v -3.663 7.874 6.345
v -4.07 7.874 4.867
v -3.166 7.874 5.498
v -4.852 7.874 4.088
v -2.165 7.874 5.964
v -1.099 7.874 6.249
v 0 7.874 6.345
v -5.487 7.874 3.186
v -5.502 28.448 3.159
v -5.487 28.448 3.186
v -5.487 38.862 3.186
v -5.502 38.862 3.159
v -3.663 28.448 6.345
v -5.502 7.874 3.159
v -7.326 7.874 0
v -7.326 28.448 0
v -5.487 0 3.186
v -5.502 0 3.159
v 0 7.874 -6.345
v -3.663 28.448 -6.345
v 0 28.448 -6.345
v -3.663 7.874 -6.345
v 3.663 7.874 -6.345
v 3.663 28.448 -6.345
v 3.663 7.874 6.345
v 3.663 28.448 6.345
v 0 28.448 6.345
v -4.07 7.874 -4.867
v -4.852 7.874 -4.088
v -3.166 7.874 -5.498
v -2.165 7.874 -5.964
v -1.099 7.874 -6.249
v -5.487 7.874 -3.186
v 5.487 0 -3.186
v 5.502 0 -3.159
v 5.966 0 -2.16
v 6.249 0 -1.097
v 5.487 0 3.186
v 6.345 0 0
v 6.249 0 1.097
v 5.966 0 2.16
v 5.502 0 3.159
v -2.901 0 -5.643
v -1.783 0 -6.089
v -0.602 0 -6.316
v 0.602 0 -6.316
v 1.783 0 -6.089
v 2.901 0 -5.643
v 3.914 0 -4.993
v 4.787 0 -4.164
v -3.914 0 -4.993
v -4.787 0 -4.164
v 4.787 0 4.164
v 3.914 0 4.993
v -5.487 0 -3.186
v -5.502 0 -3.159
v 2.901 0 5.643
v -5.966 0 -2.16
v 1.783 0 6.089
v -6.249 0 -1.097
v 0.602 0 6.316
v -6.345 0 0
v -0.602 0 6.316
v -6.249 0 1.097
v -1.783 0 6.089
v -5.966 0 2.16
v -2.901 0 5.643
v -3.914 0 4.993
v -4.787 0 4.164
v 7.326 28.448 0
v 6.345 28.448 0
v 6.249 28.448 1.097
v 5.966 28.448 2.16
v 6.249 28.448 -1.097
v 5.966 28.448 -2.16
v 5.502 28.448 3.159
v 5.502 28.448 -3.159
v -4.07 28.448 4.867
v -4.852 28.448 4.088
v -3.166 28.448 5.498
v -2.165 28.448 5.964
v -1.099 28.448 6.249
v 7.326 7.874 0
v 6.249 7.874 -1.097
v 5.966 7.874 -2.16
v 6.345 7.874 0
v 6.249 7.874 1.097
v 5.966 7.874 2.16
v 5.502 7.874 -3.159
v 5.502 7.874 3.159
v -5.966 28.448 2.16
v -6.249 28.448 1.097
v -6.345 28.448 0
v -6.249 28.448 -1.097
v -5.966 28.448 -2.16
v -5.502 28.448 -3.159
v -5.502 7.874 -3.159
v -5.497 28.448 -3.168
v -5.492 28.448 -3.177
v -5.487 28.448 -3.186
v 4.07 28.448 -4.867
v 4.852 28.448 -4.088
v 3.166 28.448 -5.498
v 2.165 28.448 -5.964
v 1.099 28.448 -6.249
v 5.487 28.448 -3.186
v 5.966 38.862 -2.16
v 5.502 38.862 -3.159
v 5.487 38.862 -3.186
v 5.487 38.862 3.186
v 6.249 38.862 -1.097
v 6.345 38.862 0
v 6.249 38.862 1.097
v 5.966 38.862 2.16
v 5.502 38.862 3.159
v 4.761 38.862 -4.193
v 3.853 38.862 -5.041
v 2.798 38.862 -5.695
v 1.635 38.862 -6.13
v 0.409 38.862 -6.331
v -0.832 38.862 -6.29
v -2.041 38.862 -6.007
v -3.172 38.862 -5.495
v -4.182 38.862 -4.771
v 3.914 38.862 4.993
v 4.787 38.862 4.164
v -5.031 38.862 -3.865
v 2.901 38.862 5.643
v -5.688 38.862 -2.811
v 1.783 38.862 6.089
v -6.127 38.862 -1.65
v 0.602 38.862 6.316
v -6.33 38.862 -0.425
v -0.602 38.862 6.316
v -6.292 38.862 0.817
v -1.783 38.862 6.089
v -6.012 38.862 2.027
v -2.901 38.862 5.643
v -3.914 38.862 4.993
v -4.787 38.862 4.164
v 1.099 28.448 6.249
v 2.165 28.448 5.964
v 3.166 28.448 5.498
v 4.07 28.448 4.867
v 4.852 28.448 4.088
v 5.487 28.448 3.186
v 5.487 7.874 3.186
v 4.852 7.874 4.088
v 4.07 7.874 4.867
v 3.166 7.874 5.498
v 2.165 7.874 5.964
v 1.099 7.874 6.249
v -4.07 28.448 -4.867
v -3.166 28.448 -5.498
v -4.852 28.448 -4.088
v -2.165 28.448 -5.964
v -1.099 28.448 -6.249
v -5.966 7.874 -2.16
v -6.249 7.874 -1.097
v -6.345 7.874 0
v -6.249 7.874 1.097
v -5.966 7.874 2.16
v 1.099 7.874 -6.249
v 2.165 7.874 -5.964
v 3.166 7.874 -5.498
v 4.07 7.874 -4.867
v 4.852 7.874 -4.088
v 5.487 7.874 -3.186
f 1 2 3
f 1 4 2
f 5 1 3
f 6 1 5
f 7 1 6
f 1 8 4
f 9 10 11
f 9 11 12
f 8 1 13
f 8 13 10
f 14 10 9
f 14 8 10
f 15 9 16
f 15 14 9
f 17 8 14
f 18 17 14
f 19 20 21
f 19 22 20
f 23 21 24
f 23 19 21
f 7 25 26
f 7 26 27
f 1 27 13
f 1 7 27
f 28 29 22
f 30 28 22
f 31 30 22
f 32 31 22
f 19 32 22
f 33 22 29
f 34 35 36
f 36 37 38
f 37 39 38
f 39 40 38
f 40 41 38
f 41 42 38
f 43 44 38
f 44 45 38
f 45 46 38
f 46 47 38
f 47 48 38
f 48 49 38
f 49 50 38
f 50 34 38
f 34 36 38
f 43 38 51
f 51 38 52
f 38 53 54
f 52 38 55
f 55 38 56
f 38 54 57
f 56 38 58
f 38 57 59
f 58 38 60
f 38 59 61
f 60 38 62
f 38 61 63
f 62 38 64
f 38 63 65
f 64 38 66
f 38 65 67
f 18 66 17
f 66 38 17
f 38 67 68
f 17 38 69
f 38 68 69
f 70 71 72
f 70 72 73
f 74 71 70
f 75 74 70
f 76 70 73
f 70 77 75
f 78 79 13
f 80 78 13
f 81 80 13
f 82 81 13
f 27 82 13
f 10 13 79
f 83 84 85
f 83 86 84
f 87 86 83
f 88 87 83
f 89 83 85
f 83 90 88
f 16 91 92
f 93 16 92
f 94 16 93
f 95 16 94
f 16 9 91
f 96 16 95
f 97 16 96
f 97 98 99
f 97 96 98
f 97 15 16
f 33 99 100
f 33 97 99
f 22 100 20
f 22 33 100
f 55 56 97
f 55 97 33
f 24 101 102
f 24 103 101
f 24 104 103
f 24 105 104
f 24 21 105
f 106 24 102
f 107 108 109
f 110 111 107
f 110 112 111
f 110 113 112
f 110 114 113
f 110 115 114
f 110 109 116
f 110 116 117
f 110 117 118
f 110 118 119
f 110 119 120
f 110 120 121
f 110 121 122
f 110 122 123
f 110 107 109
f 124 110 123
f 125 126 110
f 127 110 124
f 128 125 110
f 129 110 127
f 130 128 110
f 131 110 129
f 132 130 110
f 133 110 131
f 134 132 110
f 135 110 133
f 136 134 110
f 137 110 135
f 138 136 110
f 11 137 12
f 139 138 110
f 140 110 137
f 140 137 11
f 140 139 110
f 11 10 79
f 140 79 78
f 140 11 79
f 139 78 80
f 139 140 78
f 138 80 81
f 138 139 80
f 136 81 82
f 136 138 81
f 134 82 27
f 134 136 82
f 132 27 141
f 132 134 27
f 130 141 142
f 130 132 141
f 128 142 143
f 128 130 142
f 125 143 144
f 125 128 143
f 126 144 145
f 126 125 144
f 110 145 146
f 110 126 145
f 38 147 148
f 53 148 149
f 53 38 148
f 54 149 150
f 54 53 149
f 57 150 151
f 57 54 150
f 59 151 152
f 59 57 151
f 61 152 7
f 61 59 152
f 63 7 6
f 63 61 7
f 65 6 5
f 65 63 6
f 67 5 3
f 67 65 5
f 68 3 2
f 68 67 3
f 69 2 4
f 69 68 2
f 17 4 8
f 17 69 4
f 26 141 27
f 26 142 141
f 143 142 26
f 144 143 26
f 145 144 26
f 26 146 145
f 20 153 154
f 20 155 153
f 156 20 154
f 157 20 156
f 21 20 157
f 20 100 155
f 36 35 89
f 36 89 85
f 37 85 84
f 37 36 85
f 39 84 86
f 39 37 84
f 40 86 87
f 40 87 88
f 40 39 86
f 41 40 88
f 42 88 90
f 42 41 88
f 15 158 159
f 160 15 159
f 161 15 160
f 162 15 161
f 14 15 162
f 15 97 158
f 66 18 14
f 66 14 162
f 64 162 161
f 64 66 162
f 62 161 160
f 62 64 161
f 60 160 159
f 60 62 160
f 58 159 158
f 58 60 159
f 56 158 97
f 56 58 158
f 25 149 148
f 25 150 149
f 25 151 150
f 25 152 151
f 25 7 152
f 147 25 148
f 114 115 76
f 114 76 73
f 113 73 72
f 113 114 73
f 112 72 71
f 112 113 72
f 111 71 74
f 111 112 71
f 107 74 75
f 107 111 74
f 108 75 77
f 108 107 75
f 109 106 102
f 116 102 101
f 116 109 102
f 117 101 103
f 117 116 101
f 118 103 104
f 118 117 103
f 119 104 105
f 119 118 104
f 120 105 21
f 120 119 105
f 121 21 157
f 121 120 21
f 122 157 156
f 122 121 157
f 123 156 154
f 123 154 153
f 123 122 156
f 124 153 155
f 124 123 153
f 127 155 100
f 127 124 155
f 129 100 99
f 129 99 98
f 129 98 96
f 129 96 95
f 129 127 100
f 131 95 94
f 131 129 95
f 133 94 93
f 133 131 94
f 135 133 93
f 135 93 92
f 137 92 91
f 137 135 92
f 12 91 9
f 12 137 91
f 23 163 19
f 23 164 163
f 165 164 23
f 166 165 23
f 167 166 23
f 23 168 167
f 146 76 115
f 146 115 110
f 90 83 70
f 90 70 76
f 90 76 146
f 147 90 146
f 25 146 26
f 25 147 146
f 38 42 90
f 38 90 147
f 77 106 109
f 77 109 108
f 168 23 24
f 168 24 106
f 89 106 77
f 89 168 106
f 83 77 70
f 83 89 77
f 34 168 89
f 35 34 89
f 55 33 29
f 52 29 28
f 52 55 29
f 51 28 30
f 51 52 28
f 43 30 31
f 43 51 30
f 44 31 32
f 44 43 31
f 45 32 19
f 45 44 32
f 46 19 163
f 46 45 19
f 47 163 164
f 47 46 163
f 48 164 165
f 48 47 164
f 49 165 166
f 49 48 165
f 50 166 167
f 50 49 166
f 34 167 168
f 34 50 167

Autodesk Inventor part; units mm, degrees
ref_plane "YZ Plane" through (0, 0, 0) normal (1, 0, 0) x (0, 1, 0)
ref_plane "XZ Plane" through (0, 0, 0) normal (0, 1, 0) x (-1, 0, 0)
ref_plane "XY Plane" through (0, 0, 0) normal (0, 0, 1) x (1, 0, 0)
sketch "Sketch1" plane through (0, 0, 0) normal (0, 1, 0) x (-1, 0, 0)
  line L0 (-3.6631, -6.3447) -> (-7.3262, 0)
  line L1 (-7.3262, 0) -> (-3.6631, 6.3447)
  line L2 (-3.6631, 6.3447) -> (3.6631, 6.3447)
  line L3 (3.6631, 6.3447) -> (7.3262, 0)
  line L4 (7.3262, 0) -> (3.6631, -6.3447)
  line L5 (3.6631, -6.3447) -> (-3.6631, -6.3447)
  point P0 (0, 0)
  point P1 (0, 0)
extrude "Extrusion1" add sketch "Sketch1" along normal blind 38.862
sketch "Sketch2" plane through (0, 38.862, 0) normal (0, 1, 0) x (1, 0, 0)
  circle A0 centre (0, 0) radius 6.3447
  line L0 (-3.6631, 6.3447) -> (-7.3262, 0) projected
  line L1 (-12.7498, -15.4851) -> (22.5218, -15.4851)
  line L2 (22.5218, -15.4851) -> (22.5218, 21.9986)
  line L3 (22.5218, 21.9986) -> (-12.7498, 21.9986)
  line L4 (-12.7498, 21.9986) -> (-12.7498, -15.4851)
extrude "Extrusion2" cut sketch "Sketch2" against normal blind 10.414
sketch "Sketch3" plane through (0, 0, 0) normal (0, -1, 0) x (1, 0, 0)
  circle A0 centre (0, 0) radius 6.3447
  line L0 (13.1193, 9.9547) -> (-18.5882, 9.9547)
  line L1 (-18.5882, 9.9547) -> (-18.5882, -22.736)
  line L2 (-18.5882, -22.736) -> (13.1193, -22.736)
  line L3 (13.1193, -22.736) -> (13.1193, 9.9547)
extrude "Extrusion3" cut sketch "Sketch3" against normal blind 7.874
properties part number "Elevator Gearbox Hex"
